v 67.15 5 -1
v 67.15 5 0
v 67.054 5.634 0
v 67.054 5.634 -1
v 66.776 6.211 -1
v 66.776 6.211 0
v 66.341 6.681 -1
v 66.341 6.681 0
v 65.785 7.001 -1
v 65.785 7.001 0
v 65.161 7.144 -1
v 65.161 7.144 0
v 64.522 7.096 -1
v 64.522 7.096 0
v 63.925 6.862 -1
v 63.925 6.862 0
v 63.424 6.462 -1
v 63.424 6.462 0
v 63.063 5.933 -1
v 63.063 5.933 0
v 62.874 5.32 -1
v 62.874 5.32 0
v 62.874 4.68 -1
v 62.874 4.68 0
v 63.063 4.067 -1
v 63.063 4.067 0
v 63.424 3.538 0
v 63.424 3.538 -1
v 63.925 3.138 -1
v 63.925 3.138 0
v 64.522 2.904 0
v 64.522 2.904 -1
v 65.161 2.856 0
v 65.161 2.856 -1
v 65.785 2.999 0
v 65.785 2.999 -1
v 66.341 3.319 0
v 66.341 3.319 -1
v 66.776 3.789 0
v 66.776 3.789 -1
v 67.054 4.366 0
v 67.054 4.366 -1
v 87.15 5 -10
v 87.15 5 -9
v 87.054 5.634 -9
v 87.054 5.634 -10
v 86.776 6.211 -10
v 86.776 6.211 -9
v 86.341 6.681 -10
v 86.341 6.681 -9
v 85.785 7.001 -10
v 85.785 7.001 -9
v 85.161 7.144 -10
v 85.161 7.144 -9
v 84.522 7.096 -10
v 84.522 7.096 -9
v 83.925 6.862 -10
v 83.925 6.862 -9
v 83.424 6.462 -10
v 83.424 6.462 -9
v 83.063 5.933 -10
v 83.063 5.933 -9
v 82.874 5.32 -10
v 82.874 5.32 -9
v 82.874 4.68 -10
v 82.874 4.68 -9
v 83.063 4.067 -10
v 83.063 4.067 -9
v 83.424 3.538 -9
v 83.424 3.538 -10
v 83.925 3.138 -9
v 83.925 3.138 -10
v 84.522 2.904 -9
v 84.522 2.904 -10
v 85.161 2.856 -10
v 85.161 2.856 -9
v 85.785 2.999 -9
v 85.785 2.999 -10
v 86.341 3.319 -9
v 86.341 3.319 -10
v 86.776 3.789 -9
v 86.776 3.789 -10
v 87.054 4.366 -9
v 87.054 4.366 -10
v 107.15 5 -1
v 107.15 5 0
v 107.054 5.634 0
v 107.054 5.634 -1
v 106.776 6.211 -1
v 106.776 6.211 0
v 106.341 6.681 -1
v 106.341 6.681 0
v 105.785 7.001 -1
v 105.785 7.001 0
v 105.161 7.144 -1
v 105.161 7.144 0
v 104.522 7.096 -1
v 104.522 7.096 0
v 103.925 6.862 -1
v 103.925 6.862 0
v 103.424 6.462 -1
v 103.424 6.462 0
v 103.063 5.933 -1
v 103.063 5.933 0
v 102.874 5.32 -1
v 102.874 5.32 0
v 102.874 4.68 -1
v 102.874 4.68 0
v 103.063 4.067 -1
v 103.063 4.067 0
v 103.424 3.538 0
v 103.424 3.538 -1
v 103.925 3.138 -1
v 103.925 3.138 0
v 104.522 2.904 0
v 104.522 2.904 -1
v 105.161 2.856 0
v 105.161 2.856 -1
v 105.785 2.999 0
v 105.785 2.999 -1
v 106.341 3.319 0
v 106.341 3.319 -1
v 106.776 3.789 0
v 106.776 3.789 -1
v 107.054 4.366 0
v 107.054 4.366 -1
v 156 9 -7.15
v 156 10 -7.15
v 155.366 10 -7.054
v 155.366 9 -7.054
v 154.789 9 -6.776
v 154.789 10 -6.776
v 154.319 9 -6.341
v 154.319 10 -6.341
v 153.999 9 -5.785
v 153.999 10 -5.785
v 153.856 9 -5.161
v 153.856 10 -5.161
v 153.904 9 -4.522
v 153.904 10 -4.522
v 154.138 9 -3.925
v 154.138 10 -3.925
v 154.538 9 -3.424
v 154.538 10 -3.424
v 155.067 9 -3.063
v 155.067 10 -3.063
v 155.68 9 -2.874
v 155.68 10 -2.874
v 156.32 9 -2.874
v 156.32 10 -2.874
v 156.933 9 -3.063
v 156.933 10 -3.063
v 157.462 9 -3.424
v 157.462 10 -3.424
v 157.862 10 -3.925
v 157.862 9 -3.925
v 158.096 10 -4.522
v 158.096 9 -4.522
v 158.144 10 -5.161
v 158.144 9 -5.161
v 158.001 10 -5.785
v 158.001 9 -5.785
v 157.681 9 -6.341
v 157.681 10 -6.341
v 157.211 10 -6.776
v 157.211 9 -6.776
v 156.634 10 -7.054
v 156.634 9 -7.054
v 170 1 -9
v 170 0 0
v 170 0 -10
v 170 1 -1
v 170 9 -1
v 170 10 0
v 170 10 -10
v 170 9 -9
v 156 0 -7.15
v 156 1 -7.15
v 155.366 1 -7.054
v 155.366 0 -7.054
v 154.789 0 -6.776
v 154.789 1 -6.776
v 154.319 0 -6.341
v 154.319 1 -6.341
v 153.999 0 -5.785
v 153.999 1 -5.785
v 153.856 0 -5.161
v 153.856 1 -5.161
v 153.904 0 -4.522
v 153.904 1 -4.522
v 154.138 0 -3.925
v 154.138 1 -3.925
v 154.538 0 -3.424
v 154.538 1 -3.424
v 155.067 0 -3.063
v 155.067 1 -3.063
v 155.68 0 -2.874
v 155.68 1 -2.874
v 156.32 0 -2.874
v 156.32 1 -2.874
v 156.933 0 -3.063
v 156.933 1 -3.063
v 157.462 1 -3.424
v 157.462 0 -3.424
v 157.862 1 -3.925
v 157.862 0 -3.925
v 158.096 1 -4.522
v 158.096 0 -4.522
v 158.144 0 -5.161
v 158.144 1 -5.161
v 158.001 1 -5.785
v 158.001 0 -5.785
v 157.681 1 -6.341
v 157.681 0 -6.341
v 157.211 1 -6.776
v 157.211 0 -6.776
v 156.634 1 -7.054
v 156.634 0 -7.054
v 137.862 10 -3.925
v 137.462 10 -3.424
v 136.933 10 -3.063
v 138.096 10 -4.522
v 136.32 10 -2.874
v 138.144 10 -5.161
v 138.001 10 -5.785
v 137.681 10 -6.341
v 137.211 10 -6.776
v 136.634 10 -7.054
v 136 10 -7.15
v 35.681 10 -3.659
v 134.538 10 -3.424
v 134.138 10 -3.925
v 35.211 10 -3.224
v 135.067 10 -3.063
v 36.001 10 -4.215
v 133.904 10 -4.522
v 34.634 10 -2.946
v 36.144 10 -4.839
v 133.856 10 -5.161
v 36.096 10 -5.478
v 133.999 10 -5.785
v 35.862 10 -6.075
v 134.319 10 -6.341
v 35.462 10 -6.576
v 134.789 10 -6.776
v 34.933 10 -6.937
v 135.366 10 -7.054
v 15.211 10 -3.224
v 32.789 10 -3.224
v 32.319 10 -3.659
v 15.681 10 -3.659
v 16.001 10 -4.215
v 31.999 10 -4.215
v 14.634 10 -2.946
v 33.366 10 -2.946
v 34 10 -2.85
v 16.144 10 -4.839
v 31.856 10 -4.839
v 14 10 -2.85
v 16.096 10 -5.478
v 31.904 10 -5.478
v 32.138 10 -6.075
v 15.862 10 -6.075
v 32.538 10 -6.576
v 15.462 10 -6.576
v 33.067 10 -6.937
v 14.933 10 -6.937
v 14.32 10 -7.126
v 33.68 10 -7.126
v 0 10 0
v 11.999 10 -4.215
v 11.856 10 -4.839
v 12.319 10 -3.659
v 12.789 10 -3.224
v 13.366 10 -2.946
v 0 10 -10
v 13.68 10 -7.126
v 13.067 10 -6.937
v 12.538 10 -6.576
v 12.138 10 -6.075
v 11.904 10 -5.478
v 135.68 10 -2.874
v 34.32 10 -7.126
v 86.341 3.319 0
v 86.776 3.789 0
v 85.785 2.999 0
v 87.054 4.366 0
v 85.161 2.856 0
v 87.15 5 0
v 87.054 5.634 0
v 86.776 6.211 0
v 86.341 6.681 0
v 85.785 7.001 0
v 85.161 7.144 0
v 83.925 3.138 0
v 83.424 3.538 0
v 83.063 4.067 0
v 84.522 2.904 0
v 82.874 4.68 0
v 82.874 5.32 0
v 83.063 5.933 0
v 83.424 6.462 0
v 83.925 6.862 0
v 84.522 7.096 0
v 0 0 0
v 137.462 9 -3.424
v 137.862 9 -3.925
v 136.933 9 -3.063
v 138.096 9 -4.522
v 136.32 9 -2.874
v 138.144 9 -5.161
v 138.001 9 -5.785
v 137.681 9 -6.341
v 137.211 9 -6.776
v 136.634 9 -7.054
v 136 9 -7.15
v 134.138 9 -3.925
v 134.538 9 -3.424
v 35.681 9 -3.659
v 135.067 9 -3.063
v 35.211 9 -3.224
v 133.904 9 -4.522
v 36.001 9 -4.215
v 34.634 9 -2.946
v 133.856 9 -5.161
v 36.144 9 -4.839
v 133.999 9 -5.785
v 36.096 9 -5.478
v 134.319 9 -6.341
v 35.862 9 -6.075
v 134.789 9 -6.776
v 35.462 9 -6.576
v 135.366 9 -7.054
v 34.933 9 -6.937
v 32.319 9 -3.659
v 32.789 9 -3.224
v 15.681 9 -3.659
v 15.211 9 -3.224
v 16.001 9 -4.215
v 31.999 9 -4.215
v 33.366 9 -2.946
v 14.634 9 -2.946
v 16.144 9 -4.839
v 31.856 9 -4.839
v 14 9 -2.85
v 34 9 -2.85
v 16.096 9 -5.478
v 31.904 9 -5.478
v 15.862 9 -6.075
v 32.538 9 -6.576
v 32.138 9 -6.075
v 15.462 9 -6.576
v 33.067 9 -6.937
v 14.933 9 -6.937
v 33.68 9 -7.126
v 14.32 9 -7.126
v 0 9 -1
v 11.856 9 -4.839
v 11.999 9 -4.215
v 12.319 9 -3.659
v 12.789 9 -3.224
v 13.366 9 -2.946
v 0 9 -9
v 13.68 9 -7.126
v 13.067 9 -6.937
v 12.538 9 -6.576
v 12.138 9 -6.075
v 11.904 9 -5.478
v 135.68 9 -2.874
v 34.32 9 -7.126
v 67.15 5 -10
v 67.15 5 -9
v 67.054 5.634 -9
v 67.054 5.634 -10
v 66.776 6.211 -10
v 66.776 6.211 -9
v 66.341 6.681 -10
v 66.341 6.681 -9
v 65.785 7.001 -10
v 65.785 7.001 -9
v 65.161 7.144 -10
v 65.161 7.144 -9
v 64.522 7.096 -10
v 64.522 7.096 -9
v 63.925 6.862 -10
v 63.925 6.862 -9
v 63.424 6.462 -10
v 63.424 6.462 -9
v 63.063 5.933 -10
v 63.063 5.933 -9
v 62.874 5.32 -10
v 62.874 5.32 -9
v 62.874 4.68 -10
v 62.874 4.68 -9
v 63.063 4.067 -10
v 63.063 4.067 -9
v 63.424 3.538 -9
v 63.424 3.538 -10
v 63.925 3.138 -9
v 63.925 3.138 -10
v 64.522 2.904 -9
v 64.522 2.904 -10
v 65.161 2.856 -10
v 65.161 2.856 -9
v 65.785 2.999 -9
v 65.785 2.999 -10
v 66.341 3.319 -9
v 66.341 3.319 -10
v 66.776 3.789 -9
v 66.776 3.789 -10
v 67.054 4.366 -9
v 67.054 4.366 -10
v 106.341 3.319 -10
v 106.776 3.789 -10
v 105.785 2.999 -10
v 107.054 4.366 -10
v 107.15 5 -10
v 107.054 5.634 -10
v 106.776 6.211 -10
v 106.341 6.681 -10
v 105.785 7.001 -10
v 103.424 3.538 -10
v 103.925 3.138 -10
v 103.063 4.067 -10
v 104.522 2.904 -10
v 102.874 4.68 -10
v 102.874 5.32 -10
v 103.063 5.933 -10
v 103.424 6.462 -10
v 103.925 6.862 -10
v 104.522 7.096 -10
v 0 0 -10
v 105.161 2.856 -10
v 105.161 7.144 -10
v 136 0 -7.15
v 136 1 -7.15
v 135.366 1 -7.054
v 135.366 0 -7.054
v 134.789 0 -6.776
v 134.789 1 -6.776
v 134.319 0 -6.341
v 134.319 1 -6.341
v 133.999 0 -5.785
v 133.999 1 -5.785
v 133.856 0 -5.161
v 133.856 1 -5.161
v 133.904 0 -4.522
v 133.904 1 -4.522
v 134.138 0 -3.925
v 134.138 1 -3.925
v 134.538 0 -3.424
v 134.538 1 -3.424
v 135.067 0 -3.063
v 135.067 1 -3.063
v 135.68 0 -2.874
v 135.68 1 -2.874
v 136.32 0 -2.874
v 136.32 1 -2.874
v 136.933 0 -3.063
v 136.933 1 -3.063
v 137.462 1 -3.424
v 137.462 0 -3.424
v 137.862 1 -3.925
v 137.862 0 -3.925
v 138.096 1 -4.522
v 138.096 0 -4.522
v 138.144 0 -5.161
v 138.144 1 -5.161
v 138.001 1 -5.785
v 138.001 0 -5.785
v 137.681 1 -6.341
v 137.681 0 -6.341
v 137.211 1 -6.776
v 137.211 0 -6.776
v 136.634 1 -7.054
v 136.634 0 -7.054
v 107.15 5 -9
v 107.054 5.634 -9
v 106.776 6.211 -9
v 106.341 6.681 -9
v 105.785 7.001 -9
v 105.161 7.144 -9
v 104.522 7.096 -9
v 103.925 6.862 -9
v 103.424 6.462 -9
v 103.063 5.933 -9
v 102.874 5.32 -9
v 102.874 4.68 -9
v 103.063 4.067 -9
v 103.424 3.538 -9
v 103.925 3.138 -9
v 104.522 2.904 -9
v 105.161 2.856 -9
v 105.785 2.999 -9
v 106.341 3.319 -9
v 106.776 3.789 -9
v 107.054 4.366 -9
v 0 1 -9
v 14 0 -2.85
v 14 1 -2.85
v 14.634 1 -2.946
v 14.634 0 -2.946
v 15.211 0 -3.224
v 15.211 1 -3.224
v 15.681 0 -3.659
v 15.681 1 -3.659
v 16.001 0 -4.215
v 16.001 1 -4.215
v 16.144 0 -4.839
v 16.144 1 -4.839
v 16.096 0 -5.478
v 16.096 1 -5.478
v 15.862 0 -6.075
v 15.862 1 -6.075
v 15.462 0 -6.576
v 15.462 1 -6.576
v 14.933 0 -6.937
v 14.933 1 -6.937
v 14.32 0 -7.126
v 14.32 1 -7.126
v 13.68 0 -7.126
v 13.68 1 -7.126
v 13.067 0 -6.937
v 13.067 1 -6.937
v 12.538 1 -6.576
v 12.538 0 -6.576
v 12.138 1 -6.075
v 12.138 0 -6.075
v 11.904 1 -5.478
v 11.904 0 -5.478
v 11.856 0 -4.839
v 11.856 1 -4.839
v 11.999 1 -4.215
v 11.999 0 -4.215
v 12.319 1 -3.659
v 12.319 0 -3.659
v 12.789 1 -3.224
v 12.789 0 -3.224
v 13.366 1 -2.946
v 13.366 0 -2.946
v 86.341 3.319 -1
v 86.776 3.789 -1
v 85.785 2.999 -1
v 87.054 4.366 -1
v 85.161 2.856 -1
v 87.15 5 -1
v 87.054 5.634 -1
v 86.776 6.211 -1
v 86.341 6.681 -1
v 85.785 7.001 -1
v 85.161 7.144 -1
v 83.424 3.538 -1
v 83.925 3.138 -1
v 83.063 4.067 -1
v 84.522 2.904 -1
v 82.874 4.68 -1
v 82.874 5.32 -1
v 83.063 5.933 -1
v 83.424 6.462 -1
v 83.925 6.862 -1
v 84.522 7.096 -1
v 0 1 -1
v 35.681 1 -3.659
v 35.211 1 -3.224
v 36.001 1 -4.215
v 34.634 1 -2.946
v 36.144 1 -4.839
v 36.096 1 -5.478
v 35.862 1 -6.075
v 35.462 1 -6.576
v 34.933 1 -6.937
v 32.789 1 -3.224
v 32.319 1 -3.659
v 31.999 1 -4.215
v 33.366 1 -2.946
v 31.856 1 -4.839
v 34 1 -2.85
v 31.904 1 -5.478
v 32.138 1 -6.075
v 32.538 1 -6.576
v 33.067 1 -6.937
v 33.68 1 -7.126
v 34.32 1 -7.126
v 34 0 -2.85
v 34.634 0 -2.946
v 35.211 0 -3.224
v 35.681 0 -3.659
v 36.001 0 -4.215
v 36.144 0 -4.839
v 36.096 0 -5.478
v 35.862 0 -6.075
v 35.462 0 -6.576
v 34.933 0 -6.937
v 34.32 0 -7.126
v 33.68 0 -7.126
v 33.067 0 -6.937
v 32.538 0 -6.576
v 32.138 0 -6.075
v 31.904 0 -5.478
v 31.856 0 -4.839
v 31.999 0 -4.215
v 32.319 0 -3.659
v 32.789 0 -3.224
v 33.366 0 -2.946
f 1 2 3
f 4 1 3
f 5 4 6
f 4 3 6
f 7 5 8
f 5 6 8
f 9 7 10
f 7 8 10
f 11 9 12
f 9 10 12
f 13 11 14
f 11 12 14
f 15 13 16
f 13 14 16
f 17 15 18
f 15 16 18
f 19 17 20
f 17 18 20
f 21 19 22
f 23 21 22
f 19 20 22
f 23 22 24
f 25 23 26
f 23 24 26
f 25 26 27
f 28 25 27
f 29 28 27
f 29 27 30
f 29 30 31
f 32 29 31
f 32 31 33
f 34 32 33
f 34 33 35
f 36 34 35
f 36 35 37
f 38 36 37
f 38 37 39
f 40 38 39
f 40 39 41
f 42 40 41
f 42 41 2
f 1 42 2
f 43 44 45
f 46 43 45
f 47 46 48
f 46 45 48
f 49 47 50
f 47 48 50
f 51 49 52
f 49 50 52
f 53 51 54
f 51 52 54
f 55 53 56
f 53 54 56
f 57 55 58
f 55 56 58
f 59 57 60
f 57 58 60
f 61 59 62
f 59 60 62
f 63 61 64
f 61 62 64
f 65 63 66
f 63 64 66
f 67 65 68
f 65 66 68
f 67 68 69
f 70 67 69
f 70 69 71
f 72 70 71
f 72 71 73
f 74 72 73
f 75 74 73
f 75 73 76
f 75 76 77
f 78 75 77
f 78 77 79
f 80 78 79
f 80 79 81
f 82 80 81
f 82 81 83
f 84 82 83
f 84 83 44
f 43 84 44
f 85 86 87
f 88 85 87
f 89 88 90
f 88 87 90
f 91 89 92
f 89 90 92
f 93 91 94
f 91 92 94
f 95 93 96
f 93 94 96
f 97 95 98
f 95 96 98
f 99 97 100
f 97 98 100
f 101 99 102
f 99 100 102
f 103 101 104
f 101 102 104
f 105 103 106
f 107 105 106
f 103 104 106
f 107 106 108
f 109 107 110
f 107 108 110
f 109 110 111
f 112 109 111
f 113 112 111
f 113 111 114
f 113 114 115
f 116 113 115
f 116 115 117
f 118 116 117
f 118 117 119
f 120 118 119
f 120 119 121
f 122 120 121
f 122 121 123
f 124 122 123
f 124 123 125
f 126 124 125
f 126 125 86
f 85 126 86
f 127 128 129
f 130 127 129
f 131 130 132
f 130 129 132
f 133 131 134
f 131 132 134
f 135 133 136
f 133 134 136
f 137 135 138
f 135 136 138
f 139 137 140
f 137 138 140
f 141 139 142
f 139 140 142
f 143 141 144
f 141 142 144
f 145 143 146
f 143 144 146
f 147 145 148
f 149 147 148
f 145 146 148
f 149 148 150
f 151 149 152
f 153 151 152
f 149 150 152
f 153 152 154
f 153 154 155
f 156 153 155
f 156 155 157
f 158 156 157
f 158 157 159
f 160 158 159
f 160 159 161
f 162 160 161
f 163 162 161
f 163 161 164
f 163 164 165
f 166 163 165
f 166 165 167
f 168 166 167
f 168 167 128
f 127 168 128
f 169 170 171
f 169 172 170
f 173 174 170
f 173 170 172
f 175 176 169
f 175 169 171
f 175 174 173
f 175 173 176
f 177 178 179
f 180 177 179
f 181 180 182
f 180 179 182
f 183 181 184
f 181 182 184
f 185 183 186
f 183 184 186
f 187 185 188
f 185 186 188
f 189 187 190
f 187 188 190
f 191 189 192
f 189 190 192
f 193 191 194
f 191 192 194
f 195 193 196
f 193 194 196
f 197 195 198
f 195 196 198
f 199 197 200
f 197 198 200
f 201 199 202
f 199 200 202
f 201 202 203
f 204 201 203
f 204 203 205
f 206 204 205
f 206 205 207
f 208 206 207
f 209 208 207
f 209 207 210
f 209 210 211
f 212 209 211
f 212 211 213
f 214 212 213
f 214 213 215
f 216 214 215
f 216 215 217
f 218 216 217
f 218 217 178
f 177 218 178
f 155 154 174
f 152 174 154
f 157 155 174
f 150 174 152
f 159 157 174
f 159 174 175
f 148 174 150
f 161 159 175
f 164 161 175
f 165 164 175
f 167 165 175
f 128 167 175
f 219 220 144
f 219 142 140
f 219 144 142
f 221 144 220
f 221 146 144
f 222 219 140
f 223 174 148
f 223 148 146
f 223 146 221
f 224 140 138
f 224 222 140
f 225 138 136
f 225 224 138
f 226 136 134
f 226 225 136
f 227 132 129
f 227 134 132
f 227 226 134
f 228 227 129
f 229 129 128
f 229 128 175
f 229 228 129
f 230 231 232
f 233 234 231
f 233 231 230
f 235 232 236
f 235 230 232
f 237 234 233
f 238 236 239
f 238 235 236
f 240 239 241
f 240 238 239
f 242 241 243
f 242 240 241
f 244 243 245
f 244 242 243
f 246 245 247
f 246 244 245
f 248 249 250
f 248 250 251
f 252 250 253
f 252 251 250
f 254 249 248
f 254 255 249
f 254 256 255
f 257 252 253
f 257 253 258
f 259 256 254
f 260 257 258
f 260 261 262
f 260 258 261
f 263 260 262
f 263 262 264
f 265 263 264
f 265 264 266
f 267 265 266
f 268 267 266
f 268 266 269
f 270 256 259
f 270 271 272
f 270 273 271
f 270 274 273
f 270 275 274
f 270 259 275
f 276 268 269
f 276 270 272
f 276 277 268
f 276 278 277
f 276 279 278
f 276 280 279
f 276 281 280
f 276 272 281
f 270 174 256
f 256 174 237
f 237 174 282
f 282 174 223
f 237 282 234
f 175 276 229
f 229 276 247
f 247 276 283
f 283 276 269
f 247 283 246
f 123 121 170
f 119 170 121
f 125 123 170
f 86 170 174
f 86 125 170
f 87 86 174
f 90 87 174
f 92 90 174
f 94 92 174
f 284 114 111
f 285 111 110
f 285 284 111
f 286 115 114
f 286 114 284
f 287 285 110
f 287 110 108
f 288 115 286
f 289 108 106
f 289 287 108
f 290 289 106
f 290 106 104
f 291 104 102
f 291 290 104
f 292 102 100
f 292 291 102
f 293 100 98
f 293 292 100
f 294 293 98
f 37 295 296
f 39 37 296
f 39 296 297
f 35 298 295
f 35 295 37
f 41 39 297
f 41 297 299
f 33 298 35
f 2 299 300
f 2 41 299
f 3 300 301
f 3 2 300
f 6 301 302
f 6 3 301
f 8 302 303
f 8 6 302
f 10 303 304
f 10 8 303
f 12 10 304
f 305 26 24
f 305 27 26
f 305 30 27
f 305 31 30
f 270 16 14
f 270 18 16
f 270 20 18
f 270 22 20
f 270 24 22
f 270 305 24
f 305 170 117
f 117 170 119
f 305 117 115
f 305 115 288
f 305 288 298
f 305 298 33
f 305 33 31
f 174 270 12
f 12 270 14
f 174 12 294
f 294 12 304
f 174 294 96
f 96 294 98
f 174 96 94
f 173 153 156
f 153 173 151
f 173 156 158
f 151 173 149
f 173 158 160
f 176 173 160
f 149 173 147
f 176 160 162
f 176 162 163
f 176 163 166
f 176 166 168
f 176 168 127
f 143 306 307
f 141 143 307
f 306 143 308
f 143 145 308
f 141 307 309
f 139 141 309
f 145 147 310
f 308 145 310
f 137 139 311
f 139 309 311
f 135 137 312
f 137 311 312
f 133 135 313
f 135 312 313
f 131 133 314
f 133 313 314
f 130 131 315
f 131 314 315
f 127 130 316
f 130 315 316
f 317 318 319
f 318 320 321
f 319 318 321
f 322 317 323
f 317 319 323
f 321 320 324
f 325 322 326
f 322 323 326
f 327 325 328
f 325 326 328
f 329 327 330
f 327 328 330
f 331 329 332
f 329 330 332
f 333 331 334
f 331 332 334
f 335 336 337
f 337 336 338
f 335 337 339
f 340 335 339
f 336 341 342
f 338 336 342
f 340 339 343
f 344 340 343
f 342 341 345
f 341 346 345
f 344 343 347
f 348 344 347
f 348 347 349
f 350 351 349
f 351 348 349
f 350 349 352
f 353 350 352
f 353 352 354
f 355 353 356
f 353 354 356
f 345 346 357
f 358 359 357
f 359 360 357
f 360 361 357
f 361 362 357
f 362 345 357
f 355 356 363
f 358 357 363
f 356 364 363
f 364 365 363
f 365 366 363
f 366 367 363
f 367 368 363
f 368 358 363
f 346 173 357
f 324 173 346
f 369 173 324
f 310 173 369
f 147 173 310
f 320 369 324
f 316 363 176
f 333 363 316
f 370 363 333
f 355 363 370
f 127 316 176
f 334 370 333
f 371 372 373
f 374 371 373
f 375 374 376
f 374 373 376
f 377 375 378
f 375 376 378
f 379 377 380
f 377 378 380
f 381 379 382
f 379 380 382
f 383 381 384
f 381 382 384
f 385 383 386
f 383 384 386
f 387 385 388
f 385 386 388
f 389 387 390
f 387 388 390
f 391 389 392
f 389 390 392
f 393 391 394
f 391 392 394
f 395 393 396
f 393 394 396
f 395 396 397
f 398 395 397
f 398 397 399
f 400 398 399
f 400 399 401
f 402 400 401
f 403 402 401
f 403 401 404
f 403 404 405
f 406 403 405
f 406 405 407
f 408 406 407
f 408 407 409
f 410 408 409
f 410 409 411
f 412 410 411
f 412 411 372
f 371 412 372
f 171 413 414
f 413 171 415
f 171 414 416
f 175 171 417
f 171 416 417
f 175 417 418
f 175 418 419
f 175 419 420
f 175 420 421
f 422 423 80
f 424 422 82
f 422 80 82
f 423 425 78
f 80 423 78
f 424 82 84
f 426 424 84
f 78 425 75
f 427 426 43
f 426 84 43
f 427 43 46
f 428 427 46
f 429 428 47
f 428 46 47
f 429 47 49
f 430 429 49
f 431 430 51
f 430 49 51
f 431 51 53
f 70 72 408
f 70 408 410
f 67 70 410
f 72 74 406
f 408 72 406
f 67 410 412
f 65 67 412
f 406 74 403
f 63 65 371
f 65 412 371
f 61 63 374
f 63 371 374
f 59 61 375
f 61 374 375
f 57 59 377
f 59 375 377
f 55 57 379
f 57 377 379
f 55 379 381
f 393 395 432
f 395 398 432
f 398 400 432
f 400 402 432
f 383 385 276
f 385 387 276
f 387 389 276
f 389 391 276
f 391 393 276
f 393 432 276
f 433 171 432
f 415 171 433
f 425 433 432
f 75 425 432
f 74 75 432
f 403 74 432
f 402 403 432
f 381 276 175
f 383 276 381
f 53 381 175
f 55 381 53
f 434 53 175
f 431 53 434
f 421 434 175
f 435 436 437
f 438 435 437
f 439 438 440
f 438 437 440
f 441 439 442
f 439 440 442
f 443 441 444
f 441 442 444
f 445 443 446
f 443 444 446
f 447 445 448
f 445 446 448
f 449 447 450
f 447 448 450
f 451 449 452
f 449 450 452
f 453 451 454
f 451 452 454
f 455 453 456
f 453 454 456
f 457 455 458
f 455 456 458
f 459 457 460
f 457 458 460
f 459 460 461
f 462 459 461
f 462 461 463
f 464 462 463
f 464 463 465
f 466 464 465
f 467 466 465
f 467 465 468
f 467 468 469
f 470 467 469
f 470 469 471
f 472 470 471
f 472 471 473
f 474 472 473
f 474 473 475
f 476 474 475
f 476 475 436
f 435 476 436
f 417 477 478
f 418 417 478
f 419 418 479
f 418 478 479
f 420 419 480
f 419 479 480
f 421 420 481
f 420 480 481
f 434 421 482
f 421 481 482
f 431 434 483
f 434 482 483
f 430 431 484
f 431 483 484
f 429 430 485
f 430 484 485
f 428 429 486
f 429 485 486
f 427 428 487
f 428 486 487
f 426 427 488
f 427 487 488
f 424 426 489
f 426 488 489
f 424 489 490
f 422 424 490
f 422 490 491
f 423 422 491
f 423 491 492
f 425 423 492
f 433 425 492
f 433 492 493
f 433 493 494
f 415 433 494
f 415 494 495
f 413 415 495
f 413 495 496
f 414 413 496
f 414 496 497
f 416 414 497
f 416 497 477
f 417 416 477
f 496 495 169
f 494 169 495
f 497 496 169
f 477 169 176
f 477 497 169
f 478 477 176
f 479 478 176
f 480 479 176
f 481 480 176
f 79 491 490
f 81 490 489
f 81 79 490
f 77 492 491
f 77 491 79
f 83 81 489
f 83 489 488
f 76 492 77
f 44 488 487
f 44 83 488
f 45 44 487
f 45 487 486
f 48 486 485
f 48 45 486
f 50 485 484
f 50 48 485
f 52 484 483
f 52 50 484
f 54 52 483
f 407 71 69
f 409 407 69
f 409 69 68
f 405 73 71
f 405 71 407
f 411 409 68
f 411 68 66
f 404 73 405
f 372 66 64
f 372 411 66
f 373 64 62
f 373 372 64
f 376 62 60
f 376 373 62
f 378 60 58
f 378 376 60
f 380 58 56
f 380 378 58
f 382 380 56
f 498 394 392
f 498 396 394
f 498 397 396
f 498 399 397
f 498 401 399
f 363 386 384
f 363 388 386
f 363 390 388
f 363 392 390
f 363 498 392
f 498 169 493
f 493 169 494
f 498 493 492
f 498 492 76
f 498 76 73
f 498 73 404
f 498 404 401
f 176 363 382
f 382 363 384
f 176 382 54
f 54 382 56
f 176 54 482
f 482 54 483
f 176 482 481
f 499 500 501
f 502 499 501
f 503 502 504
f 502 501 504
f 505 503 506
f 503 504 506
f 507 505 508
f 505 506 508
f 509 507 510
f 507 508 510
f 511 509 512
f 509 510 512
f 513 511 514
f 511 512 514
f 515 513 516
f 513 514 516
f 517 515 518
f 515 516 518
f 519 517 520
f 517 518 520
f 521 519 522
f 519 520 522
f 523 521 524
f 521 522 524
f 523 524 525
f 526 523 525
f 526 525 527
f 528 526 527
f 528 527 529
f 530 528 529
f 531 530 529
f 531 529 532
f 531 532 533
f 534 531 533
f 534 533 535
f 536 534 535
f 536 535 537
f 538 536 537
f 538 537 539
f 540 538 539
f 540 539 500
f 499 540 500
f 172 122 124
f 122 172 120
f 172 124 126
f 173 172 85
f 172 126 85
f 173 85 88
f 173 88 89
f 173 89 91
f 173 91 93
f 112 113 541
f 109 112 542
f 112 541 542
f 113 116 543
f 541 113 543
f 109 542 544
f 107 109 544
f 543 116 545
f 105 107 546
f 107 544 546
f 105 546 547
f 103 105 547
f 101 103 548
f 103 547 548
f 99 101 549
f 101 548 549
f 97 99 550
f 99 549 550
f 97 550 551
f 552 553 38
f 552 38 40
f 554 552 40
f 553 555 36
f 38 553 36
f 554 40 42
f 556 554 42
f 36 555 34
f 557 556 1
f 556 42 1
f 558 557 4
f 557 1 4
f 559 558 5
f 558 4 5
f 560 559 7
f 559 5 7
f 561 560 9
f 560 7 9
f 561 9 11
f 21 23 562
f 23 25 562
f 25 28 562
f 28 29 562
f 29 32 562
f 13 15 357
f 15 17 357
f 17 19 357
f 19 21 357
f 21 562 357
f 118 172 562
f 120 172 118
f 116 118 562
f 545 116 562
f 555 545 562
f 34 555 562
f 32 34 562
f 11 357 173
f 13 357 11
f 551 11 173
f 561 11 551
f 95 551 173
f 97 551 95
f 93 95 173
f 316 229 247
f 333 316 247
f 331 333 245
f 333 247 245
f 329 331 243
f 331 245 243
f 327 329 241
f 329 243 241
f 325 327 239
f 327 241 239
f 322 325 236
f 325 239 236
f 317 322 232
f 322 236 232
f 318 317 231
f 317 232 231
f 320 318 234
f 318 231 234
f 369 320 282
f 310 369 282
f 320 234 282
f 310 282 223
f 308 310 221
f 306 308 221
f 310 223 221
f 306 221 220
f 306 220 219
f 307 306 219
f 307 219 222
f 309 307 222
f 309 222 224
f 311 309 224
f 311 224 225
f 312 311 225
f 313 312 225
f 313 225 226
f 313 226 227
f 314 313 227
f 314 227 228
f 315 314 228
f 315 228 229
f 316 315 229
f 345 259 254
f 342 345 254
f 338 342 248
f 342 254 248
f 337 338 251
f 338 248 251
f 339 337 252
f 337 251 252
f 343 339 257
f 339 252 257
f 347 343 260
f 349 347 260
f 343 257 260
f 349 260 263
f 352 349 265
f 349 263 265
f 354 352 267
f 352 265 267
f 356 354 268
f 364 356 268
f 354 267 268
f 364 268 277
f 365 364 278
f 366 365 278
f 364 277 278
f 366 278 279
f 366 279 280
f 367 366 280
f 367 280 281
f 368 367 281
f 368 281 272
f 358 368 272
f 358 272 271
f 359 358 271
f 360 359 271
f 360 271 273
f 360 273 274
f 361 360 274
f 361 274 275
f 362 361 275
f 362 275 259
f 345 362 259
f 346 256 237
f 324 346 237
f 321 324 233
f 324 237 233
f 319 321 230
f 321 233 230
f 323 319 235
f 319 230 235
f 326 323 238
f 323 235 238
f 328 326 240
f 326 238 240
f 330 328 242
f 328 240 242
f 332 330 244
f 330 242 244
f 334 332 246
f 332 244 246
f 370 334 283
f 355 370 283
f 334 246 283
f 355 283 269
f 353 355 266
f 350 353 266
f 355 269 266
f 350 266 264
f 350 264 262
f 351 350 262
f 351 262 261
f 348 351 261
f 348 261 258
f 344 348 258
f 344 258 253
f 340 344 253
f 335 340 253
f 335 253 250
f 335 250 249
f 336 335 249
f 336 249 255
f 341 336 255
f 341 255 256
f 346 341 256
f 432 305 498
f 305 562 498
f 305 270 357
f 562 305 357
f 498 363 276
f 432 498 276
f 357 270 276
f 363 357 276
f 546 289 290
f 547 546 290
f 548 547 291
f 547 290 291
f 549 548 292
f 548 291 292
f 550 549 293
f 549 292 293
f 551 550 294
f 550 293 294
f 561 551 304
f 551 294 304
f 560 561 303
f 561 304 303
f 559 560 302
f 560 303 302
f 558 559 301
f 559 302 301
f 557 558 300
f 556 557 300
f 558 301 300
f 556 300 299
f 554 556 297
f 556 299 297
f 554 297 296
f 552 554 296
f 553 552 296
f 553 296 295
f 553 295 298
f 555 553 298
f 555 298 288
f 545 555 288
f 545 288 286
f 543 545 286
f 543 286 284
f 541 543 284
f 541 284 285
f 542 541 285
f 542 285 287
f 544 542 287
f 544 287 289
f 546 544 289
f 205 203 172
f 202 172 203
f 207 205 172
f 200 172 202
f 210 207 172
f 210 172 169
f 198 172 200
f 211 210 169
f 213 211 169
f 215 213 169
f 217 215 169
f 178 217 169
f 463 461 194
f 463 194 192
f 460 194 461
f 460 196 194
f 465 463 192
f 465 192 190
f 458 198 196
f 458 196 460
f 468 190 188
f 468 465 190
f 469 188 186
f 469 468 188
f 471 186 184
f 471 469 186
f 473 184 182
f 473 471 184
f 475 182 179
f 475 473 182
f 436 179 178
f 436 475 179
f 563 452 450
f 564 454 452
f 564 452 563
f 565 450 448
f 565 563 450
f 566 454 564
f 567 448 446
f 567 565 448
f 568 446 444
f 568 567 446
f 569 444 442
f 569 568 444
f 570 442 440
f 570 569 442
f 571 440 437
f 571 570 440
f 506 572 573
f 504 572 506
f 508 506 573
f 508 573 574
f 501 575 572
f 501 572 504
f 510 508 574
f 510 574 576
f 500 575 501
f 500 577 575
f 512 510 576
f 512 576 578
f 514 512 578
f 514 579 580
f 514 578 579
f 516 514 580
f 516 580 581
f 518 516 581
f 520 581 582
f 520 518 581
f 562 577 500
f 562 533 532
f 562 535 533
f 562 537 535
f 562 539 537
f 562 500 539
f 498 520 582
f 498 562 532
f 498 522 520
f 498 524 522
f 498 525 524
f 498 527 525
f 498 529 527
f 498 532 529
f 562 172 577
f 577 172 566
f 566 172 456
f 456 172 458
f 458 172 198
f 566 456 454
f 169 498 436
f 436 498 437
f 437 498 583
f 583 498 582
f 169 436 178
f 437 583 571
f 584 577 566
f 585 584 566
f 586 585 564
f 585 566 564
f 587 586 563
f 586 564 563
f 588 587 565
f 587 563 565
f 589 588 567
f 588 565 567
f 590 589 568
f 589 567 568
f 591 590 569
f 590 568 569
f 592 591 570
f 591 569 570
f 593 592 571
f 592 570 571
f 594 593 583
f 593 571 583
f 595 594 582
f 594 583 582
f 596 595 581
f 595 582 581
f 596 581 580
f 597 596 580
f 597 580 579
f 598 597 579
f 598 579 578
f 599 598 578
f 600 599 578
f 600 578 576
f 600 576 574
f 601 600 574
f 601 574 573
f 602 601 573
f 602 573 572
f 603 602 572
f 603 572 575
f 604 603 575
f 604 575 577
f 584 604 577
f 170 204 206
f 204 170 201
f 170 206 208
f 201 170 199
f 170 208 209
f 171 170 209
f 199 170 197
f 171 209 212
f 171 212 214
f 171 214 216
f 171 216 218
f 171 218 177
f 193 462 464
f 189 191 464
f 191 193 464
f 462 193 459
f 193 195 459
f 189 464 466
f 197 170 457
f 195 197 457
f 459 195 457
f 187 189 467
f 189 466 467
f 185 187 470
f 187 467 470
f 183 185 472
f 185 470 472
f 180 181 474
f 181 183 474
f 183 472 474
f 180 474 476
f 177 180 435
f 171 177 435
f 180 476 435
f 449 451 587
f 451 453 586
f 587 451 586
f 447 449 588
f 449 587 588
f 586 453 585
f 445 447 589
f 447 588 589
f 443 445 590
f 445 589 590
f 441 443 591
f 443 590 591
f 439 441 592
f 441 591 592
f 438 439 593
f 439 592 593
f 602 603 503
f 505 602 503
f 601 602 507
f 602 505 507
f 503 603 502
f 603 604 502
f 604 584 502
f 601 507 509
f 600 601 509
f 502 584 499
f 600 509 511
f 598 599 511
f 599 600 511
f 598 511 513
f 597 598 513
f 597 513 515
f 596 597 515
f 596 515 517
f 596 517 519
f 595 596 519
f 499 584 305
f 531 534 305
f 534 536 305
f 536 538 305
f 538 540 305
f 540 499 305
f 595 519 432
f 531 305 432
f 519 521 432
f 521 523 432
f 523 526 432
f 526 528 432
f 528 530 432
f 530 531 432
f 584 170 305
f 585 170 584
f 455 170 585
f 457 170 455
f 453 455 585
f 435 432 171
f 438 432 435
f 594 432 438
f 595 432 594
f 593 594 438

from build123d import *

# Parameters (mm, degrees)
SKETCH_2_W          = 10
SKETCH_2_H          = 10
SKETCH_2_W_2        = 8
SKETCH_2_H_2        = 8
EXTRUDE_1_DEPTH     = 170
CUT_EXTRUDE_1_REACH = 172.587
SKETCH_3_R          = 2.15
SKETCH_4_R          = 2.15
CUT_EXTRUDE_2_DEPTH = 171.587221092


with BuildPart() as part:
    # ｽｹｯﾁ2 → 押し出し-薄板1 (new body)
    with BuildSketch(Plane(origin=(0, 0, 0), x_dir=(0, 0, -1), z_dir=(1, 0, 0))):
        with Locations((5, 5)):
            Rectangle(SKETCH_2_W, SKETCH_2_H)
        with Locations((5, 5)):
            Rectangle(SKETCH_2_W_2, SKETCH_2_H_2, mode=Mode.SUBTRACT)
    extrude(amount=EXTRUDE_1_DEPTH)

    # ｶｯﾄ - 押し出し1: up to this face of the body (flat: up to its plane)
    cut_extrude_1_end = Plane(part.part.faces().sort_by_distance((85, 0, -5))[0])
    # ｽｹｯﾁ3 → ｶｯﾄ - 押し出し1 (cut, up to the picked face)
    with BuildSketch(Plane(origin=(0, 10, 0), x_dir=(1, 0, 0), z_dir=(0, 1, 0)), mode=Mode.PRIVATE) as cut_extrude_1_sk1:
        with Locations(Location((14, 5, 0), (0, 0, 270))):
            Circle(SKETCH_3_R)
    cut_extrude_1_tool1 = split(extrude(cut_extrude_1_sk1.sketch, amount=-CUT_EXTRUDE_1_REACH, mode=Mode.PRIVATE), bisect_by=cut_extrude_1_end, keep=Keep.BOTH, mode=Mode.PRIVATE)
    # ｽｹｯﾁ3 → ｶｯﾄ - 押し出し1 (cut, up to the picked face)
    with BuildSketch(Plane(origin=(0, 10, 0), x_dir=(1, 0, 0), z_dir=(0, 1, 0)), mode=Mode.PRIVATE) as cut_extrude_1_sk2:
        with Locations(Location((34, 5, 0), (0, 0, 270))):
            Circle(SKETCH_3_R)
    cut_extrude_1_tool2 = split(extrude(cut_extrude_1_sk2.sketch, amount=-CUT_EXTRUDE_1_REACH, mode=Mode.PRIVATE), bisect_by=cut_extrude_1_end, keep=Keep.BOTH, mode=Mode.PRIVATE)
    # ｽｹｯﾁ3 → ｶｯﾄ - 押し出し1 (cut, up to the picked face)
    with BuildSketch(Plane(origin=(0, 10, 0), x_dir=(1, 0, 0), z_dir=(0, 1, 0)), mode=Mode.PRIVATE) as cut_extrude_1_sk3:
        with Locations(Location((136, 5, 0), (0, 0, 90))):
            Circle(SKETCH_3_R)
    cut_extrude_1_tool3 = split(extrude(cut_extrude_1_sk3.sketch, amount=-CUT_EXTRUDE_1_REACH, mode=Mode.PRIVATE), bisect_by=cut_extrude_1_end, keep=Keep.BOTH, mode=Mode.PRIVATE)
    # ｽｹｯﾁ3 → ｶｯﾄ - 押し出し1 (cut, up to the picked face)
    with BuildSketch(Plane(origin=(0, 10, 0), x_dir=(1, 0, 0), z_dir=(0, 1, 0)), mode=Mode.PRIVATE) as cut_extrude_1_sk4:
        with Locations(Location((156, 5, 0), (0, 0, 90))):
            Circle(SKETCH_3_R)
    cut_extrude_1_tool4 = split(extrude(cut_extrude_1_sk4.sketch, amount=-CUT_EXTRUDE_1_REACH, mode=Mode.PRIVATE), bisect_by=cut_extrude_1_end, keep=Keep.BOTH, mode=Mode.PRIVATE)
    add(cut_extrude_1_tool1.solids().sort_by(Axis((14, 10, -5), (0, -1, 0)))[0], mode=Mode.SUBTRACT)
    add(cut_extrude_1_tool2.solids().sort_by(Axis((34, 10, -5), (0, -1, 0)))[0], mode=Mode.SUBTRACT)
    add(cut_extrude_1_tool3.solids().sort_by(Axis((136, 10, -5), (0, -1, 0)))[0], mode=Mode.SUBTRACT)
    add(cut_extrude_1_tool4.solids().sort_by(Axis((156, 10, -5), (0, -1, 0)))[0], mode=Mode.SUBTRACT)

    # ｽｹｯﾁ4 → ｶｯﾄ - 押し出し2 (cut, through all)
    with BuildSketch(Plane.XY):
        with Locations((105, 5)):
            Circle(SKETCH_4_R)
        with Locations((85, 5)):
            Circle(SKETCH_4_R)
        with Locations((65, 5)):
            Circle(SKETCH_4_R)
    extrude(amount=-CUT_EXTRUDE_2_DEPTH, mode=Mode.SUBTRACT)


solid = part.part
